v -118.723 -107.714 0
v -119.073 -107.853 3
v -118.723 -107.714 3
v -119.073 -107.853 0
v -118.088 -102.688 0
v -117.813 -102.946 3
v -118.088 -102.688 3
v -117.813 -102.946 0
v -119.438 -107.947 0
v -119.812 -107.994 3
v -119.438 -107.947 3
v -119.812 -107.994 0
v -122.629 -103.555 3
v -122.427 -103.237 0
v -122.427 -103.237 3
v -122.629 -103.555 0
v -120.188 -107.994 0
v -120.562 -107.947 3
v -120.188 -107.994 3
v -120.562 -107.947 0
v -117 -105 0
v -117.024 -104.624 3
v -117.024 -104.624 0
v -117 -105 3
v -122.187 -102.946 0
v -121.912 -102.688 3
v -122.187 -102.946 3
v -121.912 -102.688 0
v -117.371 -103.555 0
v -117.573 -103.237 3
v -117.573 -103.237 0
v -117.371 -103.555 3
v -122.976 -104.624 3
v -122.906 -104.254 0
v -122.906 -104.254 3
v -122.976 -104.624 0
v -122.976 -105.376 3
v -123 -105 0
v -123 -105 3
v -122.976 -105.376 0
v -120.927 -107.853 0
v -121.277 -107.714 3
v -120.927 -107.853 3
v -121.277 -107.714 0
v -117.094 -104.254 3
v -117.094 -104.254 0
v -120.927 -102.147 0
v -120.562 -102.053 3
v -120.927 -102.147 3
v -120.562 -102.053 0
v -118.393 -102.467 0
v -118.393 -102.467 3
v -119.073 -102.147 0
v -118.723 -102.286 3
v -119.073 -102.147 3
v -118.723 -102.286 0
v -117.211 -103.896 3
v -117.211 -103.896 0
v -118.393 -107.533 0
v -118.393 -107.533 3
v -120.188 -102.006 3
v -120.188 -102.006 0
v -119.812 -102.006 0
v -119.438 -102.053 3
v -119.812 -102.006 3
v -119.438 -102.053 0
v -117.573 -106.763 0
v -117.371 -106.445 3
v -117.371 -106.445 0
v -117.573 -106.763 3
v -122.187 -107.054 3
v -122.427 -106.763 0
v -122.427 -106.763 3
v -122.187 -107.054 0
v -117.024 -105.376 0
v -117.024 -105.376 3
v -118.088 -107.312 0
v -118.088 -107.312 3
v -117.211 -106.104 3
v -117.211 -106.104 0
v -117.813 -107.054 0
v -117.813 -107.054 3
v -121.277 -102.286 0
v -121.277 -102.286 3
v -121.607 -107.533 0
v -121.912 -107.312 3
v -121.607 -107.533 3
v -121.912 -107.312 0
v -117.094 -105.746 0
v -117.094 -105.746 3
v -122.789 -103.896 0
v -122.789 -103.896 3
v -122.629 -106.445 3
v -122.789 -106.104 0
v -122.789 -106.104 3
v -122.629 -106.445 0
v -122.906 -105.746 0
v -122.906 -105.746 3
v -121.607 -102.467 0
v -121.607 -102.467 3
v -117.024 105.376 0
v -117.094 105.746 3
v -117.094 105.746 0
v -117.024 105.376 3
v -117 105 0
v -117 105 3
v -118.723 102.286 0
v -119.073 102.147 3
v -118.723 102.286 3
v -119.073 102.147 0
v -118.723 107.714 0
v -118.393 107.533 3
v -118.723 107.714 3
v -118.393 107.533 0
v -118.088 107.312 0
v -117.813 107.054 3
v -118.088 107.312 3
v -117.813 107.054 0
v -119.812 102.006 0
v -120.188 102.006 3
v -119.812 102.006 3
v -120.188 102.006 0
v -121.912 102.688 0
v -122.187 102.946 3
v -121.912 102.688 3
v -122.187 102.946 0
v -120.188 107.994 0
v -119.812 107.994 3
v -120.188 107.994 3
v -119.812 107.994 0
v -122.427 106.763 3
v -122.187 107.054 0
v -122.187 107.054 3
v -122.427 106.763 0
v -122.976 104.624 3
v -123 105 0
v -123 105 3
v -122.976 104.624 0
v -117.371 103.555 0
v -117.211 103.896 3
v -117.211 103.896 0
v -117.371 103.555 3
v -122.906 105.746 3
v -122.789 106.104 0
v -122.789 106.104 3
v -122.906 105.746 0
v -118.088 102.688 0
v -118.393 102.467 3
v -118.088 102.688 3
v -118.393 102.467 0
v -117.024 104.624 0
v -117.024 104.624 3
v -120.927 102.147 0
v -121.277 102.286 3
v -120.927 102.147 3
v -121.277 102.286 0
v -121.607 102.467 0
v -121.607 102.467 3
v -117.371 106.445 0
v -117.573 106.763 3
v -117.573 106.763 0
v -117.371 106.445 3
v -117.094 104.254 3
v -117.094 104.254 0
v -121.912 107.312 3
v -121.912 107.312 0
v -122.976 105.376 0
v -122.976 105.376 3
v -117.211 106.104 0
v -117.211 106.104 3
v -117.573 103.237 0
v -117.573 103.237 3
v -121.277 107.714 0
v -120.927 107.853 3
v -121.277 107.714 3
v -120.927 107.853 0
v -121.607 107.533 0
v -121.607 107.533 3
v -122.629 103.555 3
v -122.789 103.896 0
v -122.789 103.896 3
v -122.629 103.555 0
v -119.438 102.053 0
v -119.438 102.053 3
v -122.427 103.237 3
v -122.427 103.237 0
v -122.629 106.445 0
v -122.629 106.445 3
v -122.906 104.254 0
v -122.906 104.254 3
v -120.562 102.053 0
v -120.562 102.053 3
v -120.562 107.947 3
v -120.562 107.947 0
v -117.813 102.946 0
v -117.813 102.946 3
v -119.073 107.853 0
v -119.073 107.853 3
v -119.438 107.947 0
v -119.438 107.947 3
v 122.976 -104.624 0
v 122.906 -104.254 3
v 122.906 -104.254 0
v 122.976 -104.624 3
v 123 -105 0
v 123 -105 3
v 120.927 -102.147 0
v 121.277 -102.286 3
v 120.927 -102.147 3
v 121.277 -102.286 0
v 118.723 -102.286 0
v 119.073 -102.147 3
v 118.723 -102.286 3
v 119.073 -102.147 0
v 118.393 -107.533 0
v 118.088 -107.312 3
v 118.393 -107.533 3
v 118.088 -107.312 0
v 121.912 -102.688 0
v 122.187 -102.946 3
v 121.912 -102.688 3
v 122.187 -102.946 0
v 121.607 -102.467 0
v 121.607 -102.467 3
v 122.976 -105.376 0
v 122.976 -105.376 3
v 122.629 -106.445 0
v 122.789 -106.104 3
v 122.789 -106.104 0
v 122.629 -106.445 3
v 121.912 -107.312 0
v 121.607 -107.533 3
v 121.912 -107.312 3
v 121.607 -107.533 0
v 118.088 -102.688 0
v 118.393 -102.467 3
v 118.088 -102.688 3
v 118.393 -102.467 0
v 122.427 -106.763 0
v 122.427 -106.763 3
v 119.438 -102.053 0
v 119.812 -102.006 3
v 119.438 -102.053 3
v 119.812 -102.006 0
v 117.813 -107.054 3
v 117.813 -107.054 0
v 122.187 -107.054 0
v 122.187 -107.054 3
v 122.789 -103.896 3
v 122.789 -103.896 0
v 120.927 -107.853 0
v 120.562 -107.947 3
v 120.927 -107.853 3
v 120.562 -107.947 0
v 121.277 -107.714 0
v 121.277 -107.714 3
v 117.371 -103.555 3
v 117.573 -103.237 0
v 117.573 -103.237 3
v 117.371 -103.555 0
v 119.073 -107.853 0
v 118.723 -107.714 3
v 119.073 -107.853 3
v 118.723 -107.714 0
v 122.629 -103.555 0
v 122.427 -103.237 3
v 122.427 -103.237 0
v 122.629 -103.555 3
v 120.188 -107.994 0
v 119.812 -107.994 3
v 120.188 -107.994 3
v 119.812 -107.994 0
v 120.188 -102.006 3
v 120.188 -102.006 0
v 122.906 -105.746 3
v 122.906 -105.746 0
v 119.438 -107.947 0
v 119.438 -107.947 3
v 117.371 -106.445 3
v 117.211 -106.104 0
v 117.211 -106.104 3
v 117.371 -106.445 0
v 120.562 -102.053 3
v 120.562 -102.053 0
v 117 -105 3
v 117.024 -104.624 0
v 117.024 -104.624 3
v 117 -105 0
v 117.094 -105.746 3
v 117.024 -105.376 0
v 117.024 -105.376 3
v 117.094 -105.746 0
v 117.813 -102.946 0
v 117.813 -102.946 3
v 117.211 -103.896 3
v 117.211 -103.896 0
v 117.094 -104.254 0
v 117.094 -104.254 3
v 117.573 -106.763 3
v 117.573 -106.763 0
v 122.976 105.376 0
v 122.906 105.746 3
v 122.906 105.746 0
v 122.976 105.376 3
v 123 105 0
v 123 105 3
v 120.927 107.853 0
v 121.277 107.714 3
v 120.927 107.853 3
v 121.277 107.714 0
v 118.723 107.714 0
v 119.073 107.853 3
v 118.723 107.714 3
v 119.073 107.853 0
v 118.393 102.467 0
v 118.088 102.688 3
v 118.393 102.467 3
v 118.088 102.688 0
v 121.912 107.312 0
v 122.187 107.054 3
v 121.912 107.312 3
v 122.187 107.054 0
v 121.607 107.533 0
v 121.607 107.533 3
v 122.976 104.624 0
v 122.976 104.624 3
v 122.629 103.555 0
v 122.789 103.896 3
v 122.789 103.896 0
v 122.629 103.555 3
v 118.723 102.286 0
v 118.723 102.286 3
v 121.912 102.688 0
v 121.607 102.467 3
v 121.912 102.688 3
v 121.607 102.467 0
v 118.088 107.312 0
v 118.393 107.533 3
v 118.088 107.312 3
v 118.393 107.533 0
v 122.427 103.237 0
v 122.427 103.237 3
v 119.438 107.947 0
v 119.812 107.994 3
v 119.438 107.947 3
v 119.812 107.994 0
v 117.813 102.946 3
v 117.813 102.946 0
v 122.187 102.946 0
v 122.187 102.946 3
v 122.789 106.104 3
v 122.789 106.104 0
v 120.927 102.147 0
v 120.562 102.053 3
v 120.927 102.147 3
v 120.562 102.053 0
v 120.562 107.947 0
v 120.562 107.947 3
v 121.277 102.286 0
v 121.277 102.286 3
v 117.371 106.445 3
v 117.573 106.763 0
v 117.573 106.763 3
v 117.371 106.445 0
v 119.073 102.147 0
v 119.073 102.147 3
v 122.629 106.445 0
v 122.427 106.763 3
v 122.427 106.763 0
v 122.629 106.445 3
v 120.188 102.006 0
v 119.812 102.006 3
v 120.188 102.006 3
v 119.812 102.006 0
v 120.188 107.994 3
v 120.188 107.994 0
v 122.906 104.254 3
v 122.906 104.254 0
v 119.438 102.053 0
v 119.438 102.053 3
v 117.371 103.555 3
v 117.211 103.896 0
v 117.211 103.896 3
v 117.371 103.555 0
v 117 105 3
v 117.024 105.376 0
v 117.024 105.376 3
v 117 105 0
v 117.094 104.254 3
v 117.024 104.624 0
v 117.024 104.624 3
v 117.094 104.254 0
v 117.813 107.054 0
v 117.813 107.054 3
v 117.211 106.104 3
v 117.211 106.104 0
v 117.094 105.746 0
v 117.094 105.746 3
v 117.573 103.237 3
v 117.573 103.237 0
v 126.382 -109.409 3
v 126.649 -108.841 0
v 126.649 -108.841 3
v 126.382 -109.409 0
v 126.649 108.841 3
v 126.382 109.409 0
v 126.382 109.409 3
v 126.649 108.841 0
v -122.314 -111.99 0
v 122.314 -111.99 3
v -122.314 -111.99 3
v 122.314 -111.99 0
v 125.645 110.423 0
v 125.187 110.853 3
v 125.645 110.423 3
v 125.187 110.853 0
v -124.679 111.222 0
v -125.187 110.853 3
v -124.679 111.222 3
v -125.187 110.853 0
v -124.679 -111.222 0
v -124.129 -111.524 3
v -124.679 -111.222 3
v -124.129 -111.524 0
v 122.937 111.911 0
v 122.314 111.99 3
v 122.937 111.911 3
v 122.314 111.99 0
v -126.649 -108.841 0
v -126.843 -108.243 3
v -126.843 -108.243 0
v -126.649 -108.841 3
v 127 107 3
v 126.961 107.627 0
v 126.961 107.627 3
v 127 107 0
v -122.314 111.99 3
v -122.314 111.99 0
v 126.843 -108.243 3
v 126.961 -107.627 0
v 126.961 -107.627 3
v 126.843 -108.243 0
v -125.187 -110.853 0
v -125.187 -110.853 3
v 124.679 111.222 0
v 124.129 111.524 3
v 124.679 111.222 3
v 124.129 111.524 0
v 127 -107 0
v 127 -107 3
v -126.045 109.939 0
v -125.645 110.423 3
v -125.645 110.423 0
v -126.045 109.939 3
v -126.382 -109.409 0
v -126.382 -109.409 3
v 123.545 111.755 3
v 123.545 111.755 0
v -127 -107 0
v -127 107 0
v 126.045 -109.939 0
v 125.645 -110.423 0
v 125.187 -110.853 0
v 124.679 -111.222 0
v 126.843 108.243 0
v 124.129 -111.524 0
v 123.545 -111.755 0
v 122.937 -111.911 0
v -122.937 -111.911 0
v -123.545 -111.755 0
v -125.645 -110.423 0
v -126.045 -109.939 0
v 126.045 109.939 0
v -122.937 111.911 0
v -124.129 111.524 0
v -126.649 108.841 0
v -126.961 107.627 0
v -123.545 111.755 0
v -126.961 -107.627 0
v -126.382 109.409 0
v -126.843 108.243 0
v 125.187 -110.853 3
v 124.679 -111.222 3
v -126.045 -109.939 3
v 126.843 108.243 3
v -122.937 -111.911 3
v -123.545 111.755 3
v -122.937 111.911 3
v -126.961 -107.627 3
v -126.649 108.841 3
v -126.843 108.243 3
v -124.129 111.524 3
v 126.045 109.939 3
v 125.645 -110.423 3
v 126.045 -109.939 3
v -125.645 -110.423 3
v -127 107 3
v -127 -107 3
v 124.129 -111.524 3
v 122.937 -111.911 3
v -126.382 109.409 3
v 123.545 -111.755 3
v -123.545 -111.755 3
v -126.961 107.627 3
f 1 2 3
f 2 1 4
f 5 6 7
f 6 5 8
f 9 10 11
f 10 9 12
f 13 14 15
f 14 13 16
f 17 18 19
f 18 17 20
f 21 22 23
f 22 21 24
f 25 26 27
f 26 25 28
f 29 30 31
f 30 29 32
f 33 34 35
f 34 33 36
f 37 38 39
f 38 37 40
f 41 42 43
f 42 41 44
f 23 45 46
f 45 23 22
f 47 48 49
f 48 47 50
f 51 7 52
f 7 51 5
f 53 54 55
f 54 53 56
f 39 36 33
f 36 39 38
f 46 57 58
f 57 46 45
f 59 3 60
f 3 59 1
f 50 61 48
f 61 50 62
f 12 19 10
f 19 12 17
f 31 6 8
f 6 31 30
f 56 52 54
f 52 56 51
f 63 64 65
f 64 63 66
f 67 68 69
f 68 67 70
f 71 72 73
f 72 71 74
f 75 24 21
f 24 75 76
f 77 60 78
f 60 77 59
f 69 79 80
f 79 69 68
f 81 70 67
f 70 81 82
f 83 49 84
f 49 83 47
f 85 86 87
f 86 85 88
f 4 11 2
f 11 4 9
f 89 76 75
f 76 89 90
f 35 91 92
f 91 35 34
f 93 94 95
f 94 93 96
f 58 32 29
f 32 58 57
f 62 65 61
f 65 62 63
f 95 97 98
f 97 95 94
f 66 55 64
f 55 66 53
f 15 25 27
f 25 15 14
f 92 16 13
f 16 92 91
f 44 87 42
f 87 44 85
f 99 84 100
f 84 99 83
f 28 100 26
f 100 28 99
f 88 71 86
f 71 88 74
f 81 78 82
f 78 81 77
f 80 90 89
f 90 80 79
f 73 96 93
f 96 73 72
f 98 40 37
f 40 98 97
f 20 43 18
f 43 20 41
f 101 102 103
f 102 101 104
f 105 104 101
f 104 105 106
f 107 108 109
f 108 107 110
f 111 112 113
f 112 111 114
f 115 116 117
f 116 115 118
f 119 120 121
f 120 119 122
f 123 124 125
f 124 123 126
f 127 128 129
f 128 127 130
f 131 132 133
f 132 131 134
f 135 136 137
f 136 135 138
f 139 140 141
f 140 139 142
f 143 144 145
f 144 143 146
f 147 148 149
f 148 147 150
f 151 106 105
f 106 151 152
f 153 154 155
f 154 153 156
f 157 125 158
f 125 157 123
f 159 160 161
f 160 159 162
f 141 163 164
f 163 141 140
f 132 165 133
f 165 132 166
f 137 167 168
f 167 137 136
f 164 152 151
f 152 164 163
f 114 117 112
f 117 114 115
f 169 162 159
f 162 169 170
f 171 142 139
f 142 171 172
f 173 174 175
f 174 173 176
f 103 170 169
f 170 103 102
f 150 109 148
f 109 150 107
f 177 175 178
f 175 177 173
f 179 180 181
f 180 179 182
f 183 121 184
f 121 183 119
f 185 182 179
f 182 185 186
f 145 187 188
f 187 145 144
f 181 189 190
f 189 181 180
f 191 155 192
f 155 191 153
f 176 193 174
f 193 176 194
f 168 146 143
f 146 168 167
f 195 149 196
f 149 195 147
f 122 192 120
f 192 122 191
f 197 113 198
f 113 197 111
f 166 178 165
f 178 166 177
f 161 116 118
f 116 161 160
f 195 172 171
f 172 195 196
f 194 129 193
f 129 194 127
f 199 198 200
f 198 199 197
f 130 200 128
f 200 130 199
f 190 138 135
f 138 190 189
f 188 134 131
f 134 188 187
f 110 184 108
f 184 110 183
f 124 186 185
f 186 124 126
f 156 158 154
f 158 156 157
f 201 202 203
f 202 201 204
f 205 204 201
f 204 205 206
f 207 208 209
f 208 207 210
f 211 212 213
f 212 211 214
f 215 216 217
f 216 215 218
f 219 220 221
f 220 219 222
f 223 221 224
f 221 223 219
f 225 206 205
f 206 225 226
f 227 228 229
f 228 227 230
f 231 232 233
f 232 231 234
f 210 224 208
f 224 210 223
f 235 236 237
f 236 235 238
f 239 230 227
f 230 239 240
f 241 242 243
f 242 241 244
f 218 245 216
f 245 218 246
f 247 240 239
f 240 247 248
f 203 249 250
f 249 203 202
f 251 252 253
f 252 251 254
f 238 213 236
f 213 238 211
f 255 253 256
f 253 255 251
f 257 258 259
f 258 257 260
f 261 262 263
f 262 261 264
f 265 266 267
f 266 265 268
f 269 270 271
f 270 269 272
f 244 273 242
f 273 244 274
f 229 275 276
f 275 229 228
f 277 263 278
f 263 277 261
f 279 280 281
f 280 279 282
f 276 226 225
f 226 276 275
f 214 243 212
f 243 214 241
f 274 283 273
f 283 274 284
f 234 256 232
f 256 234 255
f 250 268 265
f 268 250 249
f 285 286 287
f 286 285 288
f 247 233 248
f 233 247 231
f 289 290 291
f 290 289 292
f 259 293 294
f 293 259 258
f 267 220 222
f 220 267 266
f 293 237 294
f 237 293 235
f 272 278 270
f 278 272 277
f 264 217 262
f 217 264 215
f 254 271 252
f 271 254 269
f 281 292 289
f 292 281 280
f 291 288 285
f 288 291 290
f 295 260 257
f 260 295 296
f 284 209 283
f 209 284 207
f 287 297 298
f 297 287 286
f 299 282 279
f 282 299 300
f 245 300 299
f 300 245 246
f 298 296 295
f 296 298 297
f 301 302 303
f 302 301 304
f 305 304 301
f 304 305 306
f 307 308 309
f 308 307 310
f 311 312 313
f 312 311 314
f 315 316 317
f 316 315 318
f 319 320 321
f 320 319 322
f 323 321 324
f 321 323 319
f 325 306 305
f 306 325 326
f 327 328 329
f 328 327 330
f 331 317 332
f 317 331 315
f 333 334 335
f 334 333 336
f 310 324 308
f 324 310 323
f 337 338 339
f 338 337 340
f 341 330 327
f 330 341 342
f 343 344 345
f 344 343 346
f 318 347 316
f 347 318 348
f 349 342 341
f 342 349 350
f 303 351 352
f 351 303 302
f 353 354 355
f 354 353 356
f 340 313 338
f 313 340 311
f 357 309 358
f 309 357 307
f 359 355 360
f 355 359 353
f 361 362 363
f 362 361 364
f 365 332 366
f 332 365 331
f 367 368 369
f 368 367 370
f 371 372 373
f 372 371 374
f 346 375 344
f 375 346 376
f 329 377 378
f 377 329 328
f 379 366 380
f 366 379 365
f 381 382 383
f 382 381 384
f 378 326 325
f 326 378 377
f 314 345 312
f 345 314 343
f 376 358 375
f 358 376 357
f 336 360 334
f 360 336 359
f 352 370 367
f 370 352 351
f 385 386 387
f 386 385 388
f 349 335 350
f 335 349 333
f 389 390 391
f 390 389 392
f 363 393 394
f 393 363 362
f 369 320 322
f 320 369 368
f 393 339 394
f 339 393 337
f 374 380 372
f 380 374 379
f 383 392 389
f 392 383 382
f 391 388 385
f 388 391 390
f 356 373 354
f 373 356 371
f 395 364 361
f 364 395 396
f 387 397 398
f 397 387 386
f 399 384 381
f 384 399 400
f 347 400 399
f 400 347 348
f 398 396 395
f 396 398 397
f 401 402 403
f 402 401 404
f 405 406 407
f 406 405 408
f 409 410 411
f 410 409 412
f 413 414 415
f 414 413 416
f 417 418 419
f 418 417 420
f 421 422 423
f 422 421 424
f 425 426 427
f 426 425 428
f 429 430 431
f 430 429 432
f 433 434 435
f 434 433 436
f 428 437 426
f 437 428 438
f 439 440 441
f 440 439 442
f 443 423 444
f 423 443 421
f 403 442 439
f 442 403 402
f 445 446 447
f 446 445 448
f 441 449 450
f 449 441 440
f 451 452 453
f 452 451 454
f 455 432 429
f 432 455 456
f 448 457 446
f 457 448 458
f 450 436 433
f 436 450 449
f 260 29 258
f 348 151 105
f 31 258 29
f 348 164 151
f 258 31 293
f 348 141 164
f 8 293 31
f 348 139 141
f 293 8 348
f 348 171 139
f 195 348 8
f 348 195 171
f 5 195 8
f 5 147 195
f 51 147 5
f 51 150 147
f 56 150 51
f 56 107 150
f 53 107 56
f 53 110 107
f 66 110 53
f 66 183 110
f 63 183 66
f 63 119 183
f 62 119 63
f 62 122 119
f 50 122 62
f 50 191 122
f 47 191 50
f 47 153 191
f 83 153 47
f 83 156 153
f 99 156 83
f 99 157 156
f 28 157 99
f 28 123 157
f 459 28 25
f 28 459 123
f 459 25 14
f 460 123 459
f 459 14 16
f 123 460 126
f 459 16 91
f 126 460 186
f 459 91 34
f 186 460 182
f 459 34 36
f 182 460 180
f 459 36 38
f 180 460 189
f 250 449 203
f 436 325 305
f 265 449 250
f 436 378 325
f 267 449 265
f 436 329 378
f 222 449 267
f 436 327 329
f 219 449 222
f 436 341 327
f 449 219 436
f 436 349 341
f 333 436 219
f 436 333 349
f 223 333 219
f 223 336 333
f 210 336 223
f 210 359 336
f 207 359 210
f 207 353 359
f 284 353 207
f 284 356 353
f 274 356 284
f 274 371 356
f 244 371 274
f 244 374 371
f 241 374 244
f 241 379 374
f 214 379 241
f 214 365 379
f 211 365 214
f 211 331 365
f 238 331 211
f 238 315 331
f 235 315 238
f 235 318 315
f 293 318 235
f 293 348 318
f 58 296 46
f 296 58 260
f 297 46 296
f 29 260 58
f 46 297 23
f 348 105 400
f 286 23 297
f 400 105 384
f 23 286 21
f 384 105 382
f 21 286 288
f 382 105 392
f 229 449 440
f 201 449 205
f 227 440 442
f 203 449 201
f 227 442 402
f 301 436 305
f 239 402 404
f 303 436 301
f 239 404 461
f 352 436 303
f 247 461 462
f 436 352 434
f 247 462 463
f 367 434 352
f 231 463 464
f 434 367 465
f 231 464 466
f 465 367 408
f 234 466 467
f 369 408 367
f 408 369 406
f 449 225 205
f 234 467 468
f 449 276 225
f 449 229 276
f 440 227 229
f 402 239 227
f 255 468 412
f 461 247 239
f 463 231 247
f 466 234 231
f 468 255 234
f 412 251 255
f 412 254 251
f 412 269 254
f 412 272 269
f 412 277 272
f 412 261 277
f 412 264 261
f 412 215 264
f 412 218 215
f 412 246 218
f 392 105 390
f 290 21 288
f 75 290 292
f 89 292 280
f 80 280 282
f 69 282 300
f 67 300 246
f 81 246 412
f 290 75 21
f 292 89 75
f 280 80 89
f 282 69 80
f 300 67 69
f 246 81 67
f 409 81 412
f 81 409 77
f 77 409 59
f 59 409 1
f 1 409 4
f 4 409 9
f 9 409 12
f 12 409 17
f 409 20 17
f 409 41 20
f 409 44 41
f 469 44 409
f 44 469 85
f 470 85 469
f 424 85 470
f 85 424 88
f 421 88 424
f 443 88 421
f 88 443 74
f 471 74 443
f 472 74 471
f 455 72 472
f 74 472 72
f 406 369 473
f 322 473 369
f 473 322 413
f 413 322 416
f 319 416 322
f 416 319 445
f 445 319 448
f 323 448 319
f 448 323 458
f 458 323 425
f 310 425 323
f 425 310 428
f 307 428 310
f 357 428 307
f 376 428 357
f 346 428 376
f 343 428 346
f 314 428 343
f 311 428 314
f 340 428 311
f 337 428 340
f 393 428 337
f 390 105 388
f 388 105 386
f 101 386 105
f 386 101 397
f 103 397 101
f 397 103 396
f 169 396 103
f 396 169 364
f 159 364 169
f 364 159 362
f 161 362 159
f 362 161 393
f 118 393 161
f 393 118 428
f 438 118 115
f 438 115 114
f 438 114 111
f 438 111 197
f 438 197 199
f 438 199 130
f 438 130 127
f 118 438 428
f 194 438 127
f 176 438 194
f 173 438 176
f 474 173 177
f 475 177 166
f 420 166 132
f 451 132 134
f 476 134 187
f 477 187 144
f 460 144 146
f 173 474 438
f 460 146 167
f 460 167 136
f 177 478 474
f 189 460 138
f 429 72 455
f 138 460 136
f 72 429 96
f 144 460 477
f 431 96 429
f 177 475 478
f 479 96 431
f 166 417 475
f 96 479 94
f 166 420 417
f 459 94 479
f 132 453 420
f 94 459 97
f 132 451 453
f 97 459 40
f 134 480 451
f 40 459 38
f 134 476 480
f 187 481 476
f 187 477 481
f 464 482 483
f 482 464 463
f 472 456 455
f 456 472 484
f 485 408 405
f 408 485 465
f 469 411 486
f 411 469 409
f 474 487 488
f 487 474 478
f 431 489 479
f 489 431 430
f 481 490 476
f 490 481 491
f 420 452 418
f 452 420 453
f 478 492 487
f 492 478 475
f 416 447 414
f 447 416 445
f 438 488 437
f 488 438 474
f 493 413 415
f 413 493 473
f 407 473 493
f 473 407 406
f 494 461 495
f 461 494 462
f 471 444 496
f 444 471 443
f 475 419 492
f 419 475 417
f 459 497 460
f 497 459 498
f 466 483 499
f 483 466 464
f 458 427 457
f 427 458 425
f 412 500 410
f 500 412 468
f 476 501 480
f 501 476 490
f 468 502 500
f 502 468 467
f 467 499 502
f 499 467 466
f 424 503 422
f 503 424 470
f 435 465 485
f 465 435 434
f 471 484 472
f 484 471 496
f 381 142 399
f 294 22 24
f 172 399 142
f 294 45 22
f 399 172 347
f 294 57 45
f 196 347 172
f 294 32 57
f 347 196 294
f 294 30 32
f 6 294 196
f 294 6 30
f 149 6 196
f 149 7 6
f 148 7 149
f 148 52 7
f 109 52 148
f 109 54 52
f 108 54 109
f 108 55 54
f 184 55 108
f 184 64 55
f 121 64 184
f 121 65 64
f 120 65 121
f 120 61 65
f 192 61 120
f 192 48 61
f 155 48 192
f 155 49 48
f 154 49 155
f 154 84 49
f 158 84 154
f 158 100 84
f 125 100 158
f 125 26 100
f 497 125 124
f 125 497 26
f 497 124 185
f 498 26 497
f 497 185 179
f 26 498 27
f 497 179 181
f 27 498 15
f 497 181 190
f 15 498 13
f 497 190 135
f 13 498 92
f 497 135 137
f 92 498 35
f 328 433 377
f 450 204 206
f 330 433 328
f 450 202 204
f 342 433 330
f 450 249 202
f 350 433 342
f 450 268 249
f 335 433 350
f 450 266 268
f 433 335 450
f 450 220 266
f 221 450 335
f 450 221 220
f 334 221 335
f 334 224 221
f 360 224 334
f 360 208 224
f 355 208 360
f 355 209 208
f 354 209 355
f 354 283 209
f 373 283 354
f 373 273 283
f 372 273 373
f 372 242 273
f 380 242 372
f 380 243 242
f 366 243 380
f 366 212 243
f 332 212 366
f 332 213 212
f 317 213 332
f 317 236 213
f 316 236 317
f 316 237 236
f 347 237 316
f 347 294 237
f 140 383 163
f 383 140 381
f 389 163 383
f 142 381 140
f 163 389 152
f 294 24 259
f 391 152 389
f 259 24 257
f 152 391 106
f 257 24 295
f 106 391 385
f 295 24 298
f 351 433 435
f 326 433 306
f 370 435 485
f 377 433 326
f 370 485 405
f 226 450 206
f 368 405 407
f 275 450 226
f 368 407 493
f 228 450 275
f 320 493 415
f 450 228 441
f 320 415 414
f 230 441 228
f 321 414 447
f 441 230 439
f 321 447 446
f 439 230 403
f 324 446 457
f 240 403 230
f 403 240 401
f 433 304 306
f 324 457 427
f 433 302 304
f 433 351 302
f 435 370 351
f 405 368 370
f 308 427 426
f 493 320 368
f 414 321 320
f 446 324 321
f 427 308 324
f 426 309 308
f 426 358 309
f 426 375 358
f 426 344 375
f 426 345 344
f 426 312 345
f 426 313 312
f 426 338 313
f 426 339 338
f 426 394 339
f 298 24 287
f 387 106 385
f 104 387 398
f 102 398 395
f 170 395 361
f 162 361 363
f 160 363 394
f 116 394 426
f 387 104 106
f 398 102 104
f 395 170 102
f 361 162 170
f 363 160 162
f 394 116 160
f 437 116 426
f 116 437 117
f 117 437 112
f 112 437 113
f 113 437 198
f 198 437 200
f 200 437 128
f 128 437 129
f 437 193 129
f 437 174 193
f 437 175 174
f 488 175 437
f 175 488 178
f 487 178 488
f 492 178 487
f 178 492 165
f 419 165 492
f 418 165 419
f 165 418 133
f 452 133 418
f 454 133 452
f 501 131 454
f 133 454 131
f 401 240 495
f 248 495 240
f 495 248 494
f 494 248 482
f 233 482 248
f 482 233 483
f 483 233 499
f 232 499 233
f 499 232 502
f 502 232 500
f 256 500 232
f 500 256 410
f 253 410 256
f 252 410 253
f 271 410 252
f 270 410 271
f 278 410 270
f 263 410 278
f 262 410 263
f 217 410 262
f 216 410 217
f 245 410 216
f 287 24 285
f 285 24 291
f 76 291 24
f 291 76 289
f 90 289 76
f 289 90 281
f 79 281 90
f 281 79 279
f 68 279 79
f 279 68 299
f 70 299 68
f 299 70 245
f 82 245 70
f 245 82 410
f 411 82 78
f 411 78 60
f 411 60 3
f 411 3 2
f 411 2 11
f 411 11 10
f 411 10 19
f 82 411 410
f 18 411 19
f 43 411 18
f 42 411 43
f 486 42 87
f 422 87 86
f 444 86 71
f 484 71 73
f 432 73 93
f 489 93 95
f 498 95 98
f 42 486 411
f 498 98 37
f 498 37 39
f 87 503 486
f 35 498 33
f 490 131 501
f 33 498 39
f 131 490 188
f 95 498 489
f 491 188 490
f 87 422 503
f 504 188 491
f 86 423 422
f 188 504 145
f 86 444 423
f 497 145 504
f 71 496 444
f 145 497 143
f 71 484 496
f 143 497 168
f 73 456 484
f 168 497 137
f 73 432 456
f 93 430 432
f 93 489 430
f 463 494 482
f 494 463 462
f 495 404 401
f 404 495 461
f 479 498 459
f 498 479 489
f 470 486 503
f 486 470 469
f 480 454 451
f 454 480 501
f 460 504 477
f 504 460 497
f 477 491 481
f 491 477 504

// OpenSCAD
$fn = 50;


difference() {
	union() {
		hull() {
			translate(v = [-122.0000000000, 107.0000000000, 0]) {
				cylinder(h = 3, r = 5);
			}
			translate(v = [122.0000000000, 107.0000000000, 0]) {
				cylinder(h = 3, r = 5);
			}
			translate(v = [-122.0000000000, -107.0000000000, 0]) {
				cylinder(h = 3, r = 5);
			}
			translate(v = [122.0000000000, -107.0000000000, 0]) {
				cylinder(h = 3, r = 5);
			}
		}
	}
	union() {
		translate(v = [-120.0000000000, -105.0000000000, -100.0000000000]) {
			cylinder(h = 200, r = 3.0000000000);
		}
		translate(v = [-120.0000000000, 105.0000000000, -100.0000000000]) {
			cylinder(h = 200, r = 3.0000000000);
		}
		translate(v = [120.0000000000, -105.0000000000, -100.0000000000]) {
			cylinder(h = 200, r = 3.0000000000);
		}
		translate(v = [120.0000000000, 105.0000000000, -100.0000000000]) {
			cylinder(h = 200, r = 3.0000000000);
		}
	}
}
